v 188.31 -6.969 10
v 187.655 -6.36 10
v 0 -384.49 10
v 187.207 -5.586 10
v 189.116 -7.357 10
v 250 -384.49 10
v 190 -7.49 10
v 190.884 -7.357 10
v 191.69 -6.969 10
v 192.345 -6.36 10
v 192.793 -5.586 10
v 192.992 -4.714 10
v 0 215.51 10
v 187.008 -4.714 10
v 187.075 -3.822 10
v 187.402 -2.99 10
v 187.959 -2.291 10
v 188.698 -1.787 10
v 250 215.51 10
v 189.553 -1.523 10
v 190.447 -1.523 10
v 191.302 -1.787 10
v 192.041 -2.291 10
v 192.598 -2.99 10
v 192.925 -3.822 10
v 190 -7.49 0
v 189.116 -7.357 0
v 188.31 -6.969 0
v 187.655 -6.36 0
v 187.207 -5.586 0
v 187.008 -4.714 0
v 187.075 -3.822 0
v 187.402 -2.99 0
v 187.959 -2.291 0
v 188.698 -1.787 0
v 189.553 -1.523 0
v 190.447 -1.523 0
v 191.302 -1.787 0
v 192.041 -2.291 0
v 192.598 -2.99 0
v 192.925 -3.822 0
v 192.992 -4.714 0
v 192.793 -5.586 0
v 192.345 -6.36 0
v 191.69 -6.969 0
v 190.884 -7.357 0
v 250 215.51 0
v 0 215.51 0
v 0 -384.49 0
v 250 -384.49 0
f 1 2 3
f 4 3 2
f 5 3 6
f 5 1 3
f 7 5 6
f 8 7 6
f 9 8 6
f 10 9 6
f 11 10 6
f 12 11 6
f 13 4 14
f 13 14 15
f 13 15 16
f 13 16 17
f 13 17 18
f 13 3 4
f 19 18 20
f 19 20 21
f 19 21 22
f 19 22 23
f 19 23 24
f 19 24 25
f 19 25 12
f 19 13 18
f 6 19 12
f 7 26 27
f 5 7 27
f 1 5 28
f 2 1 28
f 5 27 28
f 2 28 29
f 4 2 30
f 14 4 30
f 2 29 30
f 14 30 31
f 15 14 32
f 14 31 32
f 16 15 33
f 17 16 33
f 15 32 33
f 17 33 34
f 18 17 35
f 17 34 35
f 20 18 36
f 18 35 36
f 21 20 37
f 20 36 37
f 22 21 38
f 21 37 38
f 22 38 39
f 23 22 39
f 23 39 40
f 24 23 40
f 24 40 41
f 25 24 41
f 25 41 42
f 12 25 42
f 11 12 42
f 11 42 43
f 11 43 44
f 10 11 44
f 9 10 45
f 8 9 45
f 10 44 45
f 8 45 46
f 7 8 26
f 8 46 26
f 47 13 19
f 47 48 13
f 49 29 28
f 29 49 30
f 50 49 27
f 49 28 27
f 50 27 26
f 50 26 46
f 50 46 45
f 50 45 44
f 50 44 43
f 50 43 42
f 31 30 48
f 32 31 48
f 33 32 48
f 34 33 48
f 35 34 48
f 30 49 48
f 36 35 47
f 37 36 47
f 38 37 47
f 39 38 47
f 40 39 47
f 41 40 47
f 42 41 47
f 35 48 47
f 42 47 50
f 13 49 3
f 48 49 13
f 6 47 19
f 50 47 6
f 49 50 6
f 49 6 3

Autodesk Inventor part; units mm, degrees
ref_plane "YZ Plane" through (0, 0, 0) normal (1, 0, 0) x (0, 1, 0)
ref_plane "XZ Plane" through (0, 0, 0) normal (0, 1, 0) x (-1, 0, 0)
ref_plane "XY Plane" through (0, 0, 0) normal (0, 0, 1) x (1, 0, 0)
sketch "Skizze1" plane through (0, 0, 0) normal (0, 0, 1) x (1, 0, 0)
  line L0 (0, 215.5102) -> (250, 215.5102)
  line L1 (250, 215.5102) -> (250, -384.4898)
  line L2 (250, -384.4898) -> (0, -384.4898)
  line L3 (0, -384.4898) -> (0, 215.5102)
  point P0 (0, 0)
  point P1 (190, -4.4898)
  dimension "d0" = 250
  dimension "d2" = 600
  dimension "d3" = 60
  dimension "d4" = 220
extrude "Extrusion1" add sketch "Skizze1" along normal blind 10
hole "Bohrung1" at (190, -4.4898, 10) direction (0, 0, -1) diameter 6 end through all
properties part number "Wand rechts_CPY"
